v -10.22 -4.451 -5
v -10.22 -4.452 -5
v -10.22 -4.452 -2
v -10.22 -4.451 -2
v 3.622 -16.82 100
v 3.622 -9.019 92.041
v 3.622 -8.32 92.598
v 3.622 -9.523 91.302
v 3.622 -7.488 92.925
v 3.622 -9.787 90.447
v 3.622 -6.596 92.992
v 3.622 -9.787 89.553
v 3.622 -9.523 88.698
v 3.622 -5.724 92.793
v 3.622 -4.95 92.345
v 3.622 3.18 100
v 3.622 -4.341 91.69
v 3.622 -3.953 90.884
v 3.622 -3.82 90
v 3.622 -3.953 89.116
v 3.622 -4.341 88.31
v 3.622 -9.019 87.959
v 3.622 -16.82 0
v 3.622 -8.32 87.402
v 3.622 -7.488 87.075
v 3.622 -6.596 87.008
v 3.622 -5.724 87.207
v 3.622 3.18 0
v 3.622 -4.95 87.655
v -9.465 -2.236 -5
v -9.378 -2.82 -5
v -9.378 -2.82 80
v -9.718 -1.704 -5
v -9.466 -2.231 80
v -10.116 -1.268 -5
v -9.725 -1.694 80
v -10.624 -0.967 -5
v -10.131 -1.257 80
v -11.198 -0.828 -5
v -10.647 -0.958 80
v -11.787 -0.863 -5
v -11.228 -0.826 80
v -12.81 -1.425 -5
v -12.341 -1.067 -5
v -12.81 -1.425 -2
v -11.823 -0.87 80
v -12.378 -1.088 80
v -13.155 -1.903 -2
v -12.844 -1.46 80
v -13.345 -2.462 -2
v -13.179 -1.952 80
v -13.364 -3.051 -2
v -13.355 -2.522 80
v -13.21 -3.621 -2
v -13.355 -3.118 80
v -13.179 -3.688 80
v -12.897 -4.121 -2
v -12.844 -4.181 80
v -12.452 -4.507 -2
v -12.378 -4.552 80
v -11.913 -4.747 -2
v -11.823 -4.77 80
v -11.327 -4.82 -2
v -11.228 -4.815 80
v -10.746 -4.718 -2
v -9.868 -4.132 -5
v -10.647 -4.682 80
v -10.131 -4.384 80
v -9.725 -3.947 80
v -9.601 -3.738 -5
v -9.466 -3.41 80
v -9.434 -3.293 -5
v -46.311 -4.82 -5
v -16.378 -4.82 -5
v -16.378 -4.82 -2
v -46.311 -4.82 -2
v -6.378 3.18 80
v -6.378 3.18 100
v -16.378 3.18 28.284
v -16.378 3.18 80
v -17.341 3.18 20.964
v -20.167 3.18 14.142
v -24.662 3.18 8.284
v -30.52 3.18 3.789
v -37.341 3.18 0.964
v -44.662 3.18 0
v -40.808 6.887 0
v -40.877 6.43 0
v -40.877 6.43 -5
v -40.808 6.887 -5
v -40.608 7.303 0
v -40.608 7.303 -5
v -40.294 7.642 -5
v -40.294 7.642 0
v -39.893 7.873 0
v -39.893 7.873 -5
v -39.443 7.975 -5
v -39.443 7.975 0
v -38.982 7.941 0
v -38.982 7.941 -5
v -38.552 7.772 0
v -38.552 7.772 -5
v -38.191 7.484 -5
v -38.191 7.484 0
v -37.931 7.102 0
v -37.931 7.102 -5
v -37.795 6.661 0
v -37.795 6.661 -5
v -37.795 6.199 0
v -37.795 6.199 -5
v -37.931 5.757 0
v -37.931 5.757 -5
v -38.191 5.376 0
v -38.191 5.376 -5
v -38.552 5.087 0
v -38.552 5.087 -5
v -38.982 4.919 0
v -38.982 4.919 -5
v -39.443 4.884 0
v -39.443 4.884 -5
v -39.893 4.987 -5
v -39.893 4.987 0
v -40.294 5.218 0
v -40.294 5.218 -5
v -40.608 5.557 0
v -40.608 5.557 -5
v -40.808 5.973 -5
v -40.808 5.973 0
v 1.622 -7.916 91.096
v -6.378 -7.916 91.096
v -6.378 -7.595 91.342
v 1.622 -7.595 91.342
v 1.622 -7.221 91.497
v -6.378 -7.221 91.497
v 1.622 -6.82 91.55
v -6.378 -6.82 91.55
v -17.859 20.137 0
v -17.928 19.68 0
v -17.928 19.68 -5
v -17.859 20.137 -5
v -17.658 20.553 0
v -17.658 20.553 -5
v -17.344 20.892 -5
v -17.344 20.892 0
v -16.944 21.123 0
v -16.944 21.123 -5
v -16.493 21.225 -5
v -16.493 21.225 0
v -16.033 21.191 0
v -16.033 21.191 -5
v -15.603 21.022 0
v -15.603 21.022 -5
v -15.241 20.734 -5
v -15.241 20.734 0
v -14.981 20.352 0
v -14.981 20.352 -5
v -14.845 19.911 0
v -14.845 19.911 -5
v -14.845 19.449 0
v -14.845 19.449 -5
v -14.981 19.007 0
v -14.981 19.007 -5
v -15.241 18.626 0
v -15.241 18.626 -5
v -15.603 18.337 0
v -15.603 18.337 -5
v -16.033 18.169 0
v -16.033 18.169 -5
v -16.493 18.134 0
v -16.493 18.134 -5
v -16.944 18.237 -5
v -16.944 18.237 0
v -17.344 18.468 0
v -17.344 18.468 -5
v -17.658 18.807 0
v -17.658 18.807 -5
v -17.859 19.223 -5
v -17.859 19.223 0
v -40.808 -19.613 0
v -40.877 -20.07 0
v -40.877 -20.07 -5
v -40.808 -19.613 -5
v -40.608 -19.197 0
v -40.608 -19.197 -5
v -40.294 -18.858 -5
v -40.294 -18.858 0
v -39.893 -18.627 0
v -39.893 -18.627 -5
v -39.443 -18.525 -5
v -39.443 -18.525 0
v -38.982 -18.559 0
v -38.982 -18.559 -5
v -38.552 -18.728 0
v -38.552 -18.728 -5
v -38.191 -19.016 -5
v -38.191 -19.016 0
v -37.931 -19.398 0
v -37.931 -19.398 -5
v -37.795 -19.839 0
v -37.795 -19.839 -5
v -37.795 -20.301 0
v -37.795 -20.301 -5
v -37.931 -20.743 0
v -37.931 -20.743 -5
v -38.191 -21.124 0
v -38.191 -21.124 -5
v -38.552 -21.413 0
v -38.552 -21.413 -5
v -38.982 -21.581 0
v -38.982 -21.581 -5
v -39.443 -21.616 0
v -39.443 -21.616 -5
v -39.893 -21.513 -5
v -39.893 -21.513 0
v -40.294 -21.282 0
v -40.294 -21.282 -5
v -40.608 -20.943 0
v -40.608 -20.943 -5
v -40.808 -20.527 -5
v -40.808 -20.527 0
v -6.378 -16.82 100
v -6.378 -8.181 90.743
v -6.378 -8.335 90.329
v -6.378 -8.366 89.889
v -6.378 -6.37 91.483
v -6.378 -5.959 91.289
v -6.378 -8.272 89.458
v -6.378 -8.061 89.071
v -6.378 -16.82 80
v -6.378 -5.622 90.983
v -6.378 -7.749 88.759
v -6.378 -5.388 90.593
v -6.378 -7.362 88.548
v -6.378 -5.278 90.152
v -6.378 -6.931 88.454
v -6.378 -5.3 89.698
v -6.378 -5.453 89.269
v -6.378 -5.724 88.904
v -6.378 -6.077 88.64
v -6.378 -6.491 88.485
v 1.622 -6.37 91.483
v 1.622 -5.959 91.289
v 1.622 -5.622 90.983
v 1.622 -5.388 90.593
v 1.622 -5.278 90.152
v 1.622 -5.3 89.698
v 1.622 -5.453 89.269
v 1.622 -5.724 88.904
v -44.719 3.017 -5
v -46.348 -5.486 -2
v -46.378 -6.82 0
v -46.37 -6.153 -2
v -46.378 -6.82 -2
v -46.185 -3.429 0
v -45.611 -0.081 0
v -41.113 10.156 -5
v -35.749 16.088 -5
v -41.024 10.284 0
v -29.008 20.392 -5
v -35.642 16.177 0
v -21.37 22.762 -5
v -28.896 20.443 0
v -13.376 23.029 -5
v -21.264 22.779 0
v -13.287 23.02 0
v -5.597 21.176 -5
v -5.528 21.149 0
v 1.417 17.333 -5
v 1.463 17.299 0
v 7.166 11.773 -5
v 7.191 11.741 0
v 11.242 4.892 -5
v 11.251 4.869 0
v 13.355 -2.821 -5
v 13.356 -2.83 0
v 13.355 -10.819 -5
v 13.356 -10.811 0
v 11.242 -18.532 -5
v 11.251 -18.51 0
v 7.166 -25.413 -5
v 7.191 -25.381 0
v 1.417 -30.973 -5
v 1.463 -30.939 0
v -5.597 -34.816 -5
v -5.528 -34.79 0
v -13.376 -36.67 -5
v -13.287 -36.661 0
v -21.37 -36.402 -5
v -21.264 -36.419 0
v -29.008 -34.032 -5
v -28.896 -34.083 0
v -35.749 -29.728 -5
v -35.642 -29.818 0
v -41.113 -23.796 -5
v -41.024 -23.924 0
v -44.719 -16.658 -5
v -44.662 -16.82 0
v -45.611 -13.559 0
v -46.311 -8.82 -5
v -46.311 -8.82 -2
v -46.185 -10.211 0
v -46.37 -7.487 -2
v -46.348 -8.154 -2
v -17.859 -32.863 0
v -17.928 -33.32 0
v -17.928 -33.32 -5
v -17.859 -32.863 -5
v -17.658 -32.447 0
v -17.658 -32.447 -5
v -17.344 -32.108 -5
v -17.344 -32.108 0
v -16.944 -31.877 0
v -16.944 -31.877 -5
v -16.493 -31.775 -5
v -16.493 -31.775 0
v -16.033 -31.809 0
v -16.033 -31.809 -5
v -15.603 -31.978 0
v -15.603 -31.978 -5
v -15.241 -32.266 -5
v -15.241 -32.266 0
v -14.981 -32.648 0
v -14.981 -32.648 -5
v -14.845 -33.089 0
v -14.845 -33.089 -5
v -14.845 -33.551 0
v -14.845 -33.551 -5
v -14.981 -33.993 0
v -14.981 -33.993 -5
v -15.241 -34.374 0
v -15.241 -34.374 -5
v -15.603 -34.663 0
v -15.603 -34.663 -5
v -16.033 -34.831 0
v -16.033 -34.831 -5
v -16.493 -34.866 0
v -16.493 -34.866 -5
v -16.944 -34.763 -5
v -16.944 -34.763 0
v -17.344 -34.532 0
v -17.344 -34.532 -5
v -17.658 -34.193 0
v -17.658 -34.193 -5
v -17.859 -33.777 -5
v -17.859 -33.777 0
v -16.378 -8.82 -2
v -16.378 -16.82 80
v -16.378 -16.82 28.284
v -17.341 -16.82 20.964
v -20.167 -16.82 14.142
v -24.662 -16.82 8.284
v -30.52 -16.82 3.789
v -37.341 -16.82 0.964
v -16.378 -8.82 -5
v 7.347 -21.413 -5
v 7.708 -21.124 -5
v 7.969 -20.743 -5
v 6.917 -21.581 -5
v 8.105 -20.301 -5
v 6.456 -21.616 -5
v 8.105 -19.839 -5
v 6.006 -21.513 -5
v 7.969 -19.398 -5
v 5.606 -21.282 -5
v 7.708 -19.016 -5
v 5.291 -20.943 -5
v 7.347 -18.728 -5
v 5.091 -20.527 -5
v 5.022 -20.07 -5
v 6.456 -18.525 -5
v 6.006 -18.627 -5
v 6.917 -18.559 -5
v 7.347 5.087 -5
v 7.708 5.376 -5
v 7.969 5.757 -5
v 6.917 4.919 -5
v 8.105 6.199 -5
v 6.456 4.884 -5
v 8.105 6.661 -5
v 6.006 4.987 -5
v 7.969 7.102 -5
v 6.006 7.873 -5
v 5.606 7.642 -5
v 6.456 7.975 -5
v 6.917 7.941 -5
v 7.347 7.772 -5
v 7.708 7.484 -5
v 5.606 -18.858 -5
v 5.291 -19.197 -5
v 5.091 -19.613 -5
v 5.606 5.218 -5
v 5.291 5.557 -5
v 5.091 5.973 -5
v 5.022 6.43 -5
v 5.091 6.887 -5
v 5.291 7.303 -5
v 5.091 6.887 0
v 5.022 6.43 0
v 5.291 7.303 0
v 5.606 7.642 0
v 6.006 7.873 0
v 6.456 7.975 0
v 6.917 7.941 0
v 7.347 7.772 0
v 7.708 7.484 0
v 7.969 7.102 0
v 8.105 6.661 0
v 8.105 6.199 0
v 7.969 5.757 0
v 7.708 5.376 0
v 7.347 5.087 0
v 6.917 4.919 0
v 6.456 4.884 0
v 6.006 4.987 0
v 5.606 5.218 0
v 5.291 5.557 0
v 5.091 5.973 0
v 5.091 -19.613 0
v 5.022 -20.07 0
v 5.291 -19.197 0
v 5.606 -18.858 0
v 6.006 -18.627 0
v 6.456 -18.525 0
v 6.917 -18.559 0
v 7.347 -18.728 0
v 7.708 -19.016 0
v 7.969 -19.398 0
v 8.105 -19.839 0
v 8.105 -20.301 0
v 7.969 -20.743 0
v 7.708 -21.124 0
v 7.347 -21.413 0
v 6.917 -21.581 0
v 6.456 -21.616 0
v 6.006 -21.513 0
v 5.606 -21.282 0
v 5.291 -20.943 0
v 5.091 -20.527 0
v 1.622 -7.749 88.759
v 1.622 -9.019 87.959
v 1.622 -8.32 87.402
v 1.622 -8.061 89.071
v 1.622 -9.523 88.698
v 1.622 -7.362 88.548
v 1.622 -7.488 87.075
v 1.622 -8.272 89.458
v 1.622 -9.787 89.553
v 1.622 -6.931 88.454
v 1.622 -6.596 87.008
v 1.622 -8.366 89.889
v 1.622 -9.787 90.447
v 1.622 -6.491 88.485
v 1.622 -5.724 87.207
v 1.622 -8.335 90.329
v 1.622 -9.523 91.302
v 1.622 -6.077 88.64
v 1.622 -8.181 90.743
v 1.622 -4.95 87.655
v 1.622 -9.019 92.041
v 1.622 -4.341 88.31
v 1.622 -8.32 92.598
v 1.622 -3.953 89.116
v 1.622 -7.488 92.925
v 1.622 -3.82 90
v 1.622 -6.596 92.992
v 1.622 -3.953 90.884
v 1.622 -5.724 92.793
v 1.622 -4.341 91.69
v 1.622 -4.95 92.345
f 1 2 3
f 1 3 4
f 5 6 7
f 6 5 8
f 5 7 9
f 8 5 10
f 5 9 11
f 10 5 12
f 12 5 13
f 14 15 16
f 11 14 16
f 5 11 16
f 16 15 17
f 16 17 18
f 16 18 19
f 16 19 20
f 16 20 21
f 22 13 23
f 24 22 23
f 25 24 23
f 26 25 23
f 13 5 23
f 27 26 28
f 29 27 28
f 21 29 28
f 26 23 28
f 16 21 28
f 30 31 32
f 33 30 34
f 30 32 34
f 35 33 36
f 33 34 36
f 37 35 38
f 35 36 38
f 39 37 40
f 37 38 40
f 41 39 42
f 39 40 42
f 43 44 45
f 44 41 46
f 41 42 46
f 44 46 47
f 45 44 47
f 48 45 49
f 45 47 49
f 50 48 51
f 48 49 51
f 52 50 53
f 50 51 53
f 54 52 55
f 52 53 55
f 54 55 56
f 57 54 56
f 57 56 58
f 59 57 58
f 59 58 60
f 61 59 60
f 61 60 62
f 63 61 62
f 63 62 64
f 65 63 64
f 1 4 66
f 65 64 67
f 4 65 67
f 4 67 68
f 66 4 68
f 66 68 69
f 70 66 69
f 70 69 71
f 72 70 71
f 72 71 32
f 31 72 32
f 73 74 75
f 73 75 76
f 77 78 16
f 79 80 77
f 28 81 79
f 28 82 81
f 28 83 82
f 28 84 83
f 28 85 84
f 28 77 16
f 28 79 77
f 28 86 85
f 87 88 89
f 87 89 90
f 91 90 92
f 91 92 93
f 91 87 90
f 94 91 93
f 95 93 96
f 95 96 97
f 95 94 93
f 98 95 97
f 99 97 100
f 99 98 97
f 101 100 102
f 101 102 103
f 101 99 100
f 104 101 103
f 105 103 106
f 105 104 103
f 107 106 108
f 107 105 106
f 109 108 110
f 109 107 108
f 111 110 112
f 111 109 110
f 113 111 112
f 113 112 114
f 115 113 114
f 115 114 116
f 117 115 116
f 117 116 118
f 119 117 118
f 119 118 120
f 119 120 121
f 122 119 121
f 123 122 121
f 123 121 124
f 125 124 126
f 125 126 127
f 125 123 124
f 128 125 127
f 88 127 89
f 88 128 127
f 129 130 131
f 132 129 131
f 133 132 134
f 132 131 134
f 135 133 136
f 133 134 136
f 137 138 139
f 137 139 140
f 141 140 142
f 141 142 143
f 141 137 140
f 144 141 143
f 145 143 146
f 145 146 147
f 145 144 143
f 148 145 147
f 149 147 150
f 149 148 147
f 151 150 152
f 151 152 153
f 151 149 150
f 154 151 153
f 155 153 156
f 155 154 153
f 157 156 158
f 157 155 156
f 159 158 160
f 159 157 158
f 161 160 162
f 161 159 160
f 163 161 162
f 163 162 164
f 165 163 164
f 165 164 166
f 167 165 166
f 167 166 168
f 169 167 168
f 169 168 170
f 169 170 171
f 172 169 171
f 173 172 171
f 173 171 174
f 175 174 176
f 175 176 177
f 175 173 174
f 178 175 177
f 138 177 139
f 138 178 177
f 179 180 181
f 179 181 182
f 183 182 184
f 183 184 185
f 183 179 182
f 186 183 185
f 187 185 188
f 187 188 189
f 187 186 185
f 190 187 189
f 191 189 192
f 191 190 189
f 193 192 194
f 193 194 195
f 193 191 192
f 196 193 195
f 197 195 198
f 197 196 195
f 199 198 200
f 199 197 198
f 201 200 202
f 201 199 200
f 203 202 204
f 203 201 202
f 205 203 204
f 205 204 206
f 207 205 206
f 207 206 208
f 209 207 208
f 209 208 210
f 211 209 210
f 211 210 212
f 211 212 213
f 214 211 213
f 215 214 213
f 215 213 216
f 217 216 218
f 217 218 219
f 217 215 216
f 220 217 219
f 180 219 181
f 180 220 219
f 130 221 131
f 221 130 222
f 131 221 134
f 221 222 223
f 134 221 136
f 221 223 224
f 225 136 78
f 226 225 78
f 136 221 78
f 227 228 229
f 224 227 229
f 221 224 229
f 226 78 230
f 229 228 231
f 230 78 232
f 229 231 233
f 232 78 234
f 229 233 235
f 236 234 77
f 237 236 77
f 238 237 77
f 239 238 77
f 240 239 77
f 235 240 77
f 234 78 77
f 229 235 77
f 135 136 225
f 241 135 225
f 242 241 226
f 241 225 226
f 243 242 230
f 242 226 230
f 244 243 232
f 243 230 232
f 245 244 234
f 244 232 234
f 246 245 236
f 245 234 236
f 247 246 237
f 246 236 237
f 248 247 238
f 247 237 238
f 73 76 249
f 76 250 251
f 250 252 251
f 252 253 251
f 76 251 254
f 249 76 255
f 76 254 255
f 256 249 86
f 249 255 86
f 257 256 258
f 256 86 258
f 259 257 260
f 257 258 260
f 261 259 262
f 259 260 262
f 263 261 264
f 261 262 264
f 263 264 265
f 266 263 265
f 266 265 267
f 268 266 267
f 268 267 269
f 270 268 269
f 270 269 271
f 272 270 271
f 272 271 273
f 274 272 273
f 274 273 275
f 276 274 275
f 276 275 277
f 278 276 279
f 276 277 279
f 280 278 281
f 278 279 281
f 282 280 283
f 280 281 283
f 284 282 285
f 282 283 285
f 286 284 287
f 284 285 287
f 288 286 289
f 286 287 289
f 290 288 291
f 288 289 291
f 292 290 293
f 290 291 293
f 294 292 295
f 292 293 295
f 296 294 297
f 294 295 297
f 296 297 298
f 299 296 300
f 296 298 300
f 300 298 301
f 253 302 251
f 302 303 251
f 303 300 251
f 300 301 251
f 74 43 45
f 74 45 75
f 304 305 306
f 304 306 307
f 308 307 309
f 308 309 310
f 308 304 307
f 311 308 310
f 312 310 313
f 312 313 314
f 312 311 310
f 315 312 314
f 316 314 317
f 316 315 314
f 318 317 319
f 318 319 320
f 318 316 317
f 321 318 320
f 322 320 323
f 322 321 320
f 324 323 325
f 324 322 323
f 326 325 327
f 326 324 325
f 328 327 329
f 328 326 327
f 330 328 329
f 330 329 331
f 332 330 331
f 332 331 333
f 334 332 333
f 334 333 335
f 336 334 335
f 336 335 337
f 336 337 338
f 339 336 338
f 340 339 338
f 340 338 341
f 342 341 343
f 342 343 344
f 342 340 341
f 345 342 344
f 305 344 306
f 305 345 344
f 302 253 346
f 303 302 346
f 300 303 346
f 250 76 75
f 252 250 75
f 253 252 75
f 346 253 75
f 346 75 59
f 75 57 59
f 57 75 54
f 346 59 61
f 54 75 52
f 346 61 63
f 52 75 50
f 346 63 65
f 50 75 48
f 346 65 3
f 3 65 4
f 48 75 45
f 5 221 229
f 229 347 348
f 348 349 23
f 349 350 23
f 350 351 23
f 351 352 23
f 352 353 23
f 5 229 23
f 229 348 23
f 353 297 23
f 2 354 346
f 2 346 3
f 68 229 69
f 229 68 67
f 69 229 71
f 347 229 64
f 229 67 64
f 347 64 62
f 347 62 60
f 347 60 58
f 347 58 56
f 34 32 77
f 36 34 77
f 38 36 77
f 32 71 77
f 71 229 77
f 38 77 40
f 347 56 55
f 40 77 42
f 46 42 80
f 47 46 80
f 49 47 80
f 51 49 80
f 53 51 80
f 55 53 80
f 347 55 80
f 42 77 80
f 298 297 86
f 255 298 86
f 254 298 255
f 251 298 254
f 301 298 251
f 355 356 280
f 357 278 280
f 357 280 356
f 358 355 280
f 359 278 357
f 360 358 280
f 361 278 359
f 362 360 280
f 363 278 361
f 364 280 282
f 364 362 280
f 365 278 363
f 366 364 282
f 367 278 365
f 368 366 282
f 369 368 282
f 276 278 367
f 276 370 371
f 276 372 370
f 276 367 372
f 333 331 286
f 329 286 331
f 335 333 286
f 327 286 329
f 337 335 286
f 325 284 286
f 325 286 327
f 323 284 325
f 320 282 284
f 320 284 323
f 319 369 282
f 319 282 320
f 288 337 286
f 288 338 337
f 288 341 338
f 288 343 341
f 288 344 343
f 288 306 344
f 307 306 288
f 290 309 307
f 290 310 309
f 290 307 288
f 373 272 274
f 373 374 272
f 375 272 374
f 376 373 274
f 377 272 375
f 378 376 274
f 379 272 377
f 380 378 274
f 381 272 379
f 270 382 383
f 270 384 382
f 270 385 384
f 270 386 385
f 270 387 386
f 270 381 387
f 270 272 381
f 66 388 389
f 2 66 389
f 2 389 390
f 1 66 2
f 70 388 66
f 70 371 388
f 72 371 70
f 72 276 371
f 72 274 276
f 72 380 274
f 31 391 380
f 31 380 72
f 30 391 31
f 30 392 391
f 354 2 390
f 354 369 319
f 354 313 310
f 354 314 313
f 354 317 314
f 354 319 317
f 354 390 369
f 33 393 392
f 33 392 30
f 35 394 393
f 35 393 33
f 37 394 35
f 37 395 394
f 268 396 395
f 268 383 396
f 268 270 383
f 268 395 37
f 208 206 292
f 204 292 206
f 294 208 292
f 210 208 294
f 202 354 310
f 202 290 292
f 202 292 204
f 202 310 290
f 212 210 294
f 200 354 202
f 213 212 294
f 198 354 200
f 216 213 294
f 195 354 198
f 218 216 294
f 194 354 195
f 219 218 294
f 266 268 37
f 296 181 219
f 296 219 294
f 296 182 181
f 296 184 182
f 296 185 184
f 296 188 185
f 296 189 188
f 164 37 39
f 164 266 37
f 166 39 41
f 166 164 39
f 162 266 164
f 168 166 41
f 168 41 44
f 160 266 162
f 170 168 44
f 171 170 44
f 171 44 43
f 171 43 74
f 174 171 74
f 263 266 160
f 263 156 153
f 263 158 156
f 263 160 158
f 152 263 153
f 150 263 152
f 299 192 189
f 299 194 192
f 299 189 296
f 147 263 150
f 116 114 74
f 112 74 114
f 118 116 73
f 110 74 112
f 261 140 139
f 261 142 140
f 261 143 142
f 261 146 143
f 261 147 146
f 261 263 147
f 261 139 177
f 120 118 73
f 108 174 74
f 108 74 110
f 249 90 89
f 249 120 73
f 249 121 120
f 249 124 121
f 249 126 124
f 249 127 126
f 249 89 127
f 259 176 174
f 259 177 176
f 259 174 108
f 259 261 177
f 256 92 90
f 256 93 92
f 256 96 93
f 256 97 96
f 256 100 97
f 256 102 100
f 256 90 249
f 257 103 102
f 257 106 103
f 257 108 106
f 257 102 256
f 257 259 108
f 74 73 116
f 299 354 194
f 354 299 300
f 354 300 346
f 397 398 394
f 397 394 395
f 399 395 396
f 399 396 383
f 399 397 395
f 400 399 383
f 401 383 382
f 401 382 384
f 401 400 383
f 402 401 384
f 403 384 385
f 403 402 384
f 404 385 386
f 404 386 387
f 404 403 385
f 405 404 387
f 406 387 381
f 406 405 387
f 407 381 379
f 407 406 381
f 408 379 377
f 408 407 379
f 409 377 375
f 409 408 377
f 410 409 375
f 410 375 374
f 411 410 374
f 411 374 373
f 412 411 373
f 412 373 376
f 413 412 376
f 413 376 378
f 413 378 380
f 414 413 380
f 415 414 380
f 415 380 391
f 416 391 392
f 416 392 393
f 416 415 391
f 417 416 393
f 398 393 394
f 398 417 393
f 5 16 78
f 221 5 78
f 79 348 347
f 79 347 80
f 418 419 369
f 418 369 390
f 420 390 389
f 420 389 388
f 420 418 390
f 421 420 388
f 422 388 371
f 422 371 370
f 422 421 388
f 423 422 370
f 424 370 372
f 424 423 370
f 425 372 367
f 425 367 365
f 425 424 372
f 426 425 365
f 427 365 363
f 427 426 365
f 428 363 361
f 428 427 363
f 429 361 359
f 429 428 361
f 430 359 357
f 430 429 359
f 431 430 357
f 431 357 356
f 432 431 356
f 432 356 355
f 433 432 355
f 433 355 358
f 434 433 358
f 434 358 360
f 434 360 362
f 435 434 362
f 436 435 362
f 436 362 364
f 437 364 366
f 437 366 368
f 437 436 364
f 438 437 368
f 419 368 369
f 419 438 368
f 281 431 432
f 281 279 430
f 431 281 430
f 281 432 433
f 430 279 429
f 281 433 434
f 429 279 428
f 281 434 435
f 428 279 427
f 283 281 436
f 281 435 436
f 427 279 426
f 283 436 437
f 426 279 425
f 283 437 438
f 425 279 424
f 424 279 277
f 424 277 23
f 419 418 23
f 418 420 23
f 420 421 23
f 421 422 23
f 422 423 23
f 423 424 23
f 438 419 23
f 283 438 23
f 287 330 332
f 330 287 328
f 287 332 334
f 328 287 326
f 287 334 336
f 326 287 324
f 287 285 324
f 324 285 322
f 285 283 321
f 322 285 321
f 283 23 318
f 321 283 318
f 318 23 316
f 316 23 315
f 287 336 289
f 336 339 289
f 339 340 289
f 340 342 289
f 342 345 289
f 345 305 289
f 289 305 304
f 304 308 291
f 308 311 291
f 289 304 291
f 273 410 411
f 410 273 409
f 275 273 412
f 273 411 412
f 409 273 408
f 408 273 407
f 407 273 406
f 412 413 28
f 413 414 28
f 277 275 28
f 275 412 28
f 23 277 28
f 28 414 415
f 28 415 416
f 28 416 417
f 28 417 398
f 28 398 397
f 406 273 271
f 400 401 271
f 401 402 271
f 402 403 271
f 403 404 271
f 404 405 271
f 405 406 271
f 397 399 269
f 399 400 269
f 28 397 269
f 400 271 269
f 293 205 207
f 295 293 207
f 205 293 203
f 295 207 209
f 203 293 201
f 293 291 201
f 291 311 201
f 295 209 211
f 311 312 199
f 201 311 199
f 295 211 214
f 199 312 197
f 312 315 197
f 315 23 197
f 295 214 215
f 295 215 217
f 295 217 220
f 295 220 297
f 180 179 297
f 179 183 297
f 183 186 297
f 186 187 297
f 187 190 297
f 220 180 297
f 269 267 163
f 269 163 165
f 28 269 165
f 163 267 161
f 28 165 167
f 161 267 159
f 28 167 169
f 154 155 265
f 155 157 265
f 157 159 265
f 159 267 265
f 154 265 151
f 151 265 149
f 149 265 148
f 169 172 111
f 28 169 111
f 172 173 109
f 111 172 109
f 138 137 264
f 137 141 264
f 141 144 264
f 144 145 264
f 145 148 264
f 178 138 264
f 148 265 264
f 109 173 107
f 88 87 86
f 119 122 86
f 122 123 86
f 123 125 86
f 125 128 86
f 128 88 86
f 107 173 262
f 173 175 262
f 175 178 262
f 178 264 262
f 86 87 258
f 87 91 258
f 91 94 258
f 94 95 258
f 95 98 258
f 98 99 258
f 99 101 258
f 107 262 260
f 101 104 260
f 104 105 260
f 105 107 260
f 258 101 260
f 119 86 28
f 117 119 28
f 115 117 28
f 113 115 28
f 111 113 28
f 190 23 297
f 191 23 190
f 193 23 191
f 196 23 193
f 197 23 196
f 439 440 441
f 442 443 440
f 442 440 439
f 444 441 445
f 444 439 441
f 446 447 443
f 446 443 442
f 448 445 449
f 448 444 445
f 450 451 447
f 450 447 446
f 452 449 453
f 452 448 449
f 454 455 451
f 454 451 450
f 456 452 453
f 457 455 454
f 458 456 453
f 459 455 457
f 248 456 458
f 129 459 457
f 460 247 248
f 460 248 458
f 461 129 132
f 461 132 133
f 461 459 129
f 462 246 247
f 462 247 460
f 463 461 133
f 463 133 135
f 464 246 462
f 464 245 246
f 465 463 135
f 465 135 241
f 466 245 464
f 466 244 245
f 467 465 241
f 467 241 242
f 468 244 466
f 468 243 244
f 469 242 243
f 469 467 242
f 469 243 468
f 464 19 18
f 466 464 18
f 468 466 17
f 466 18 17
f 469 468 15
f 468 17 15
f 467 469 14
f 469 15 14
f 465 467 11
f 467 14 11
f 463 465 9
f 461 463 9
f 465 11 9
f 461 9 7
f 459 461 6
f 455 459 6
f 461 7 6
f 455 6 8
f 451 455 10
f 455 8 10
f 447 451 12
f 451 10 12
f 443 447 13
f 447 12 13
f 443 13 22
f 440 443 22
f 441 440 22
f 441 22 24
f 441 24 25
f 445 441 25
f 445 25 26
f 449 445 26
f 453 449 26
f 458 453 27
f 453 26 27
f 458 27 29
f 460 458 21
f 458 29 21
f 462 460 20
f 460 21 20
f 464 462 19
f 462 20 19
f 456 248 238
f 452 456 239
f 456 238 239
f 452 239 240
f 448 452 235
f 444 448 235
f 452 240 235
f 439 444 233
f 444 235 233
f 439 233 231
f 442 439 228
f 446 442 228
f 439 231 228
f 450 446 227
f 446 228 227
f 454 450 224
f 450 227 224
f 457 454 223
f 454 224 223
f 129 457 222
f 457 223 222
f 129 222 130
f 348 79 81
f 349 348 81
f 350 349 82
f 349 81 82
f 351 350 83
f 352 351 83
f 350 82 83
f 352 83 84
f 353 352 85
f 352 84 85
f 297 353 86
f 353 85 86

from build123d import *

# Parameters (mm, degrees)
SKETCH_1_W          = 20
SKETCH_1_H          = 20
EXTRUDE_1_DEPTH     = 140
SKETCH_2_R          = 30
SKETCH_2_R_2        = 1.55
EXTRUDE_2_DEPTH     = 5
SKETCH_3_W          = 28.284271248
SKETCH_3_H          = 20
EXTRUDE_3_DEPTH     = 28.28427125
CUT_EXTRUDE_1_DEPTH = 28.28427125
CUT_EXTRUDE_2_DEPTH = 28.28427125
CUT_EXTRUDE_3_DEPTH = 28.28427125
SKETCH_8_R          = 3
CUT_EXTRUDE_4_DEPTH = 2
SKETCH_9_R          = 2
CUT_EXTRUDE_5_DEPTH = 100
CUT_EXTRUDE_6_DEPTH = 3


with BuildPart() as part:
    # 草图1 → 凸台-拉伸1 (new body)
    with BuildSketch(Plane.XY):
        with Locations((-6.377546769, -6.820183169)):
            Rectangle(SKETCH_1_W, SKETCH_1_H)
    extrude(amount=EXTRUDE_1_DEPTH)

    # 草图2 → 凸台-拉伸2 (add)
    with BuildSketch(Plane(origin=(0, 0, 0), x_dir=(-1, 0, 0), z_dir=(0, 0, -1))):
        with Locations((16.377546769, -6.820183169)):
            Circle(SKETCH_2_R)
        with Locations((-6.572126431, 6.429816831)):
            Circle(SKETCH_2_R_2, mode=Mode.SUBTRACT)
        with Locations((16.377546769, 19.679816831)):
            Circle(SKETCH_2_R_2, mode=Mode.SUBTRACT)
        with Locations((39.32721997, 6.429816831)):
            Circle(SKETCH_2_R_2, mode=Mode.SUBTRACT)
        with Locations((39.32721997, -20.070183169)):
            Circle(SKETCH_2_R_2, mode=Mode.SUBTRACT)
        with Locations((16.377546769, -33.320183169)):
            Circle(SKETCH_2_R_2, mode=Mode.SUBTRACT)
        with Locations((-6.572126431, -20.070183169)):
            Circle(SKETCH_2_R_2, mode=Mode.SUBTRACT)
    extrude(amount=EXTRUDE_2_DEPTH)

    # 草图3 → 凸台-拉伸3 (add)
    with BuildSketch(Plane.XY):
        with Locations((-30.519682393, -6.820183169)):
            Rectangle(SKETCH_3_W, SKETCH_3_H)
    extrude(amount=EXTRUDE_3_DEPTH)

    # 草图4 → 切除-拉伸1 (cut)
    with BuildSketch(Plane(origin=(0, 3.179816831, 0), x_dir=(1, 0, 0), z_dir=(0, 1, 0))):
        with BuildLine():
            Line((-44.661818017, -3e-09), (-44.661818017, -28.28427125))
            Line((-44.661818017, -28.28427125), (-16.377546769, -28.28427125))
            ThreePointArc((-16.377546769, -28.28427125), (-24.661818017, -8.28427125), (-44.661818017, -3e-09))
        make_face()
    extrude(amount=-CUT_EXTRUDE_1_DEPTH, mode=Mode.SUBTRACT)

    # 草图6 → 切除-拉伸2 (cut)
    with BuildSketch(Plane(origin=(0, 3.179816831, 0), x_dir=(1, 0, 0), z_dir=(0, 1, 0))):
        Polygon((3.622453231, -140), (3.622453231, -100), (-6.377546769, -100), (-6.377546769, -80), (-16.377546769, -80), (-16.377546769, -100), (-16.377546769, -140), align=None)
    extrude(amount=-CUT_EXTRUDE_2_DEPTH, mode=Mode.SUBTRACT)

    # 草图7 → 切除-拉伸3 (cut)
    with BuildSketch(Plane.ZY.offset(6.377546769)):
        with BuildLine():
            ThreePointArc((91.55, -6.820183169), (90.59315932, -5.388169893), (88.903984489, -5.724167658))
            Line((88.903984489, -5.724167658), (91.096015511, -7.91619868))
            ThreePointArc((91.096015511, -7.91619868), (91.432013275, -7.413342489), (91.55, -6.820183169))
        make_face()
        with BuildLine():
            Line((91.096015511, -7.91619868), (88.903984489, -5.724167658))
            ThreePointArc((88.903984489, -5.724167658), (88.903984489, -7.91619868), (91.096015511, -7.91619868))
        make_face()
    extrude(amount=-CUT_EXTRUDE_3_DEPTH, mode=Mode.SUBTRACT)

    # 草图8 → 切除-拉伸4 (cut)
    with BuildSketch(Plane(origin=(3.622453231, 0, 0), x_dir=(0, 0, -1), z_dir=(1, 0, 0))):
        with Locations(Location((-90, -6.820183169, 0), (0, 0, 90))):
            Circle(SKETCH_8_R)
    extrude(amount=-CUT_EXTRUDE_4_DEPTH, mode=Mode.SUBTRACT)

    # 草图9 → 切除-拉伸5 (cut)
    with BuildSketch(Plane.XY.offset(80)):
        with Locations((-11.377546769, -2.820183169)):
            Circle(SKETCH_9_R)
    extrude(amount=-CUT_EXTRUDE_5_DEPTH, mode=Mode.SUBTRACT)

    # 草图10 → 切除-拉伸6 (cut)
    with BuildSketch(Plane(origin=(0, 0, -5), x_dir=(-1, 0, 0), z_dir=(0, 0, -1))):
        Polygon((16.377546769, -4.820183169), (48.333202205, -4.820183169), (48.333202205, -8.820183169), (16.377546769, -8.820183169), (10.220063838, -4.45167354), (11.377546769, -2.820183169), (12.810373312, -1.424830848), align=None)
    extrude(amount=-CUT_EXTRUDE_6_DEPTH, mode=Mode.SUBTRACT)


solid = part.part
